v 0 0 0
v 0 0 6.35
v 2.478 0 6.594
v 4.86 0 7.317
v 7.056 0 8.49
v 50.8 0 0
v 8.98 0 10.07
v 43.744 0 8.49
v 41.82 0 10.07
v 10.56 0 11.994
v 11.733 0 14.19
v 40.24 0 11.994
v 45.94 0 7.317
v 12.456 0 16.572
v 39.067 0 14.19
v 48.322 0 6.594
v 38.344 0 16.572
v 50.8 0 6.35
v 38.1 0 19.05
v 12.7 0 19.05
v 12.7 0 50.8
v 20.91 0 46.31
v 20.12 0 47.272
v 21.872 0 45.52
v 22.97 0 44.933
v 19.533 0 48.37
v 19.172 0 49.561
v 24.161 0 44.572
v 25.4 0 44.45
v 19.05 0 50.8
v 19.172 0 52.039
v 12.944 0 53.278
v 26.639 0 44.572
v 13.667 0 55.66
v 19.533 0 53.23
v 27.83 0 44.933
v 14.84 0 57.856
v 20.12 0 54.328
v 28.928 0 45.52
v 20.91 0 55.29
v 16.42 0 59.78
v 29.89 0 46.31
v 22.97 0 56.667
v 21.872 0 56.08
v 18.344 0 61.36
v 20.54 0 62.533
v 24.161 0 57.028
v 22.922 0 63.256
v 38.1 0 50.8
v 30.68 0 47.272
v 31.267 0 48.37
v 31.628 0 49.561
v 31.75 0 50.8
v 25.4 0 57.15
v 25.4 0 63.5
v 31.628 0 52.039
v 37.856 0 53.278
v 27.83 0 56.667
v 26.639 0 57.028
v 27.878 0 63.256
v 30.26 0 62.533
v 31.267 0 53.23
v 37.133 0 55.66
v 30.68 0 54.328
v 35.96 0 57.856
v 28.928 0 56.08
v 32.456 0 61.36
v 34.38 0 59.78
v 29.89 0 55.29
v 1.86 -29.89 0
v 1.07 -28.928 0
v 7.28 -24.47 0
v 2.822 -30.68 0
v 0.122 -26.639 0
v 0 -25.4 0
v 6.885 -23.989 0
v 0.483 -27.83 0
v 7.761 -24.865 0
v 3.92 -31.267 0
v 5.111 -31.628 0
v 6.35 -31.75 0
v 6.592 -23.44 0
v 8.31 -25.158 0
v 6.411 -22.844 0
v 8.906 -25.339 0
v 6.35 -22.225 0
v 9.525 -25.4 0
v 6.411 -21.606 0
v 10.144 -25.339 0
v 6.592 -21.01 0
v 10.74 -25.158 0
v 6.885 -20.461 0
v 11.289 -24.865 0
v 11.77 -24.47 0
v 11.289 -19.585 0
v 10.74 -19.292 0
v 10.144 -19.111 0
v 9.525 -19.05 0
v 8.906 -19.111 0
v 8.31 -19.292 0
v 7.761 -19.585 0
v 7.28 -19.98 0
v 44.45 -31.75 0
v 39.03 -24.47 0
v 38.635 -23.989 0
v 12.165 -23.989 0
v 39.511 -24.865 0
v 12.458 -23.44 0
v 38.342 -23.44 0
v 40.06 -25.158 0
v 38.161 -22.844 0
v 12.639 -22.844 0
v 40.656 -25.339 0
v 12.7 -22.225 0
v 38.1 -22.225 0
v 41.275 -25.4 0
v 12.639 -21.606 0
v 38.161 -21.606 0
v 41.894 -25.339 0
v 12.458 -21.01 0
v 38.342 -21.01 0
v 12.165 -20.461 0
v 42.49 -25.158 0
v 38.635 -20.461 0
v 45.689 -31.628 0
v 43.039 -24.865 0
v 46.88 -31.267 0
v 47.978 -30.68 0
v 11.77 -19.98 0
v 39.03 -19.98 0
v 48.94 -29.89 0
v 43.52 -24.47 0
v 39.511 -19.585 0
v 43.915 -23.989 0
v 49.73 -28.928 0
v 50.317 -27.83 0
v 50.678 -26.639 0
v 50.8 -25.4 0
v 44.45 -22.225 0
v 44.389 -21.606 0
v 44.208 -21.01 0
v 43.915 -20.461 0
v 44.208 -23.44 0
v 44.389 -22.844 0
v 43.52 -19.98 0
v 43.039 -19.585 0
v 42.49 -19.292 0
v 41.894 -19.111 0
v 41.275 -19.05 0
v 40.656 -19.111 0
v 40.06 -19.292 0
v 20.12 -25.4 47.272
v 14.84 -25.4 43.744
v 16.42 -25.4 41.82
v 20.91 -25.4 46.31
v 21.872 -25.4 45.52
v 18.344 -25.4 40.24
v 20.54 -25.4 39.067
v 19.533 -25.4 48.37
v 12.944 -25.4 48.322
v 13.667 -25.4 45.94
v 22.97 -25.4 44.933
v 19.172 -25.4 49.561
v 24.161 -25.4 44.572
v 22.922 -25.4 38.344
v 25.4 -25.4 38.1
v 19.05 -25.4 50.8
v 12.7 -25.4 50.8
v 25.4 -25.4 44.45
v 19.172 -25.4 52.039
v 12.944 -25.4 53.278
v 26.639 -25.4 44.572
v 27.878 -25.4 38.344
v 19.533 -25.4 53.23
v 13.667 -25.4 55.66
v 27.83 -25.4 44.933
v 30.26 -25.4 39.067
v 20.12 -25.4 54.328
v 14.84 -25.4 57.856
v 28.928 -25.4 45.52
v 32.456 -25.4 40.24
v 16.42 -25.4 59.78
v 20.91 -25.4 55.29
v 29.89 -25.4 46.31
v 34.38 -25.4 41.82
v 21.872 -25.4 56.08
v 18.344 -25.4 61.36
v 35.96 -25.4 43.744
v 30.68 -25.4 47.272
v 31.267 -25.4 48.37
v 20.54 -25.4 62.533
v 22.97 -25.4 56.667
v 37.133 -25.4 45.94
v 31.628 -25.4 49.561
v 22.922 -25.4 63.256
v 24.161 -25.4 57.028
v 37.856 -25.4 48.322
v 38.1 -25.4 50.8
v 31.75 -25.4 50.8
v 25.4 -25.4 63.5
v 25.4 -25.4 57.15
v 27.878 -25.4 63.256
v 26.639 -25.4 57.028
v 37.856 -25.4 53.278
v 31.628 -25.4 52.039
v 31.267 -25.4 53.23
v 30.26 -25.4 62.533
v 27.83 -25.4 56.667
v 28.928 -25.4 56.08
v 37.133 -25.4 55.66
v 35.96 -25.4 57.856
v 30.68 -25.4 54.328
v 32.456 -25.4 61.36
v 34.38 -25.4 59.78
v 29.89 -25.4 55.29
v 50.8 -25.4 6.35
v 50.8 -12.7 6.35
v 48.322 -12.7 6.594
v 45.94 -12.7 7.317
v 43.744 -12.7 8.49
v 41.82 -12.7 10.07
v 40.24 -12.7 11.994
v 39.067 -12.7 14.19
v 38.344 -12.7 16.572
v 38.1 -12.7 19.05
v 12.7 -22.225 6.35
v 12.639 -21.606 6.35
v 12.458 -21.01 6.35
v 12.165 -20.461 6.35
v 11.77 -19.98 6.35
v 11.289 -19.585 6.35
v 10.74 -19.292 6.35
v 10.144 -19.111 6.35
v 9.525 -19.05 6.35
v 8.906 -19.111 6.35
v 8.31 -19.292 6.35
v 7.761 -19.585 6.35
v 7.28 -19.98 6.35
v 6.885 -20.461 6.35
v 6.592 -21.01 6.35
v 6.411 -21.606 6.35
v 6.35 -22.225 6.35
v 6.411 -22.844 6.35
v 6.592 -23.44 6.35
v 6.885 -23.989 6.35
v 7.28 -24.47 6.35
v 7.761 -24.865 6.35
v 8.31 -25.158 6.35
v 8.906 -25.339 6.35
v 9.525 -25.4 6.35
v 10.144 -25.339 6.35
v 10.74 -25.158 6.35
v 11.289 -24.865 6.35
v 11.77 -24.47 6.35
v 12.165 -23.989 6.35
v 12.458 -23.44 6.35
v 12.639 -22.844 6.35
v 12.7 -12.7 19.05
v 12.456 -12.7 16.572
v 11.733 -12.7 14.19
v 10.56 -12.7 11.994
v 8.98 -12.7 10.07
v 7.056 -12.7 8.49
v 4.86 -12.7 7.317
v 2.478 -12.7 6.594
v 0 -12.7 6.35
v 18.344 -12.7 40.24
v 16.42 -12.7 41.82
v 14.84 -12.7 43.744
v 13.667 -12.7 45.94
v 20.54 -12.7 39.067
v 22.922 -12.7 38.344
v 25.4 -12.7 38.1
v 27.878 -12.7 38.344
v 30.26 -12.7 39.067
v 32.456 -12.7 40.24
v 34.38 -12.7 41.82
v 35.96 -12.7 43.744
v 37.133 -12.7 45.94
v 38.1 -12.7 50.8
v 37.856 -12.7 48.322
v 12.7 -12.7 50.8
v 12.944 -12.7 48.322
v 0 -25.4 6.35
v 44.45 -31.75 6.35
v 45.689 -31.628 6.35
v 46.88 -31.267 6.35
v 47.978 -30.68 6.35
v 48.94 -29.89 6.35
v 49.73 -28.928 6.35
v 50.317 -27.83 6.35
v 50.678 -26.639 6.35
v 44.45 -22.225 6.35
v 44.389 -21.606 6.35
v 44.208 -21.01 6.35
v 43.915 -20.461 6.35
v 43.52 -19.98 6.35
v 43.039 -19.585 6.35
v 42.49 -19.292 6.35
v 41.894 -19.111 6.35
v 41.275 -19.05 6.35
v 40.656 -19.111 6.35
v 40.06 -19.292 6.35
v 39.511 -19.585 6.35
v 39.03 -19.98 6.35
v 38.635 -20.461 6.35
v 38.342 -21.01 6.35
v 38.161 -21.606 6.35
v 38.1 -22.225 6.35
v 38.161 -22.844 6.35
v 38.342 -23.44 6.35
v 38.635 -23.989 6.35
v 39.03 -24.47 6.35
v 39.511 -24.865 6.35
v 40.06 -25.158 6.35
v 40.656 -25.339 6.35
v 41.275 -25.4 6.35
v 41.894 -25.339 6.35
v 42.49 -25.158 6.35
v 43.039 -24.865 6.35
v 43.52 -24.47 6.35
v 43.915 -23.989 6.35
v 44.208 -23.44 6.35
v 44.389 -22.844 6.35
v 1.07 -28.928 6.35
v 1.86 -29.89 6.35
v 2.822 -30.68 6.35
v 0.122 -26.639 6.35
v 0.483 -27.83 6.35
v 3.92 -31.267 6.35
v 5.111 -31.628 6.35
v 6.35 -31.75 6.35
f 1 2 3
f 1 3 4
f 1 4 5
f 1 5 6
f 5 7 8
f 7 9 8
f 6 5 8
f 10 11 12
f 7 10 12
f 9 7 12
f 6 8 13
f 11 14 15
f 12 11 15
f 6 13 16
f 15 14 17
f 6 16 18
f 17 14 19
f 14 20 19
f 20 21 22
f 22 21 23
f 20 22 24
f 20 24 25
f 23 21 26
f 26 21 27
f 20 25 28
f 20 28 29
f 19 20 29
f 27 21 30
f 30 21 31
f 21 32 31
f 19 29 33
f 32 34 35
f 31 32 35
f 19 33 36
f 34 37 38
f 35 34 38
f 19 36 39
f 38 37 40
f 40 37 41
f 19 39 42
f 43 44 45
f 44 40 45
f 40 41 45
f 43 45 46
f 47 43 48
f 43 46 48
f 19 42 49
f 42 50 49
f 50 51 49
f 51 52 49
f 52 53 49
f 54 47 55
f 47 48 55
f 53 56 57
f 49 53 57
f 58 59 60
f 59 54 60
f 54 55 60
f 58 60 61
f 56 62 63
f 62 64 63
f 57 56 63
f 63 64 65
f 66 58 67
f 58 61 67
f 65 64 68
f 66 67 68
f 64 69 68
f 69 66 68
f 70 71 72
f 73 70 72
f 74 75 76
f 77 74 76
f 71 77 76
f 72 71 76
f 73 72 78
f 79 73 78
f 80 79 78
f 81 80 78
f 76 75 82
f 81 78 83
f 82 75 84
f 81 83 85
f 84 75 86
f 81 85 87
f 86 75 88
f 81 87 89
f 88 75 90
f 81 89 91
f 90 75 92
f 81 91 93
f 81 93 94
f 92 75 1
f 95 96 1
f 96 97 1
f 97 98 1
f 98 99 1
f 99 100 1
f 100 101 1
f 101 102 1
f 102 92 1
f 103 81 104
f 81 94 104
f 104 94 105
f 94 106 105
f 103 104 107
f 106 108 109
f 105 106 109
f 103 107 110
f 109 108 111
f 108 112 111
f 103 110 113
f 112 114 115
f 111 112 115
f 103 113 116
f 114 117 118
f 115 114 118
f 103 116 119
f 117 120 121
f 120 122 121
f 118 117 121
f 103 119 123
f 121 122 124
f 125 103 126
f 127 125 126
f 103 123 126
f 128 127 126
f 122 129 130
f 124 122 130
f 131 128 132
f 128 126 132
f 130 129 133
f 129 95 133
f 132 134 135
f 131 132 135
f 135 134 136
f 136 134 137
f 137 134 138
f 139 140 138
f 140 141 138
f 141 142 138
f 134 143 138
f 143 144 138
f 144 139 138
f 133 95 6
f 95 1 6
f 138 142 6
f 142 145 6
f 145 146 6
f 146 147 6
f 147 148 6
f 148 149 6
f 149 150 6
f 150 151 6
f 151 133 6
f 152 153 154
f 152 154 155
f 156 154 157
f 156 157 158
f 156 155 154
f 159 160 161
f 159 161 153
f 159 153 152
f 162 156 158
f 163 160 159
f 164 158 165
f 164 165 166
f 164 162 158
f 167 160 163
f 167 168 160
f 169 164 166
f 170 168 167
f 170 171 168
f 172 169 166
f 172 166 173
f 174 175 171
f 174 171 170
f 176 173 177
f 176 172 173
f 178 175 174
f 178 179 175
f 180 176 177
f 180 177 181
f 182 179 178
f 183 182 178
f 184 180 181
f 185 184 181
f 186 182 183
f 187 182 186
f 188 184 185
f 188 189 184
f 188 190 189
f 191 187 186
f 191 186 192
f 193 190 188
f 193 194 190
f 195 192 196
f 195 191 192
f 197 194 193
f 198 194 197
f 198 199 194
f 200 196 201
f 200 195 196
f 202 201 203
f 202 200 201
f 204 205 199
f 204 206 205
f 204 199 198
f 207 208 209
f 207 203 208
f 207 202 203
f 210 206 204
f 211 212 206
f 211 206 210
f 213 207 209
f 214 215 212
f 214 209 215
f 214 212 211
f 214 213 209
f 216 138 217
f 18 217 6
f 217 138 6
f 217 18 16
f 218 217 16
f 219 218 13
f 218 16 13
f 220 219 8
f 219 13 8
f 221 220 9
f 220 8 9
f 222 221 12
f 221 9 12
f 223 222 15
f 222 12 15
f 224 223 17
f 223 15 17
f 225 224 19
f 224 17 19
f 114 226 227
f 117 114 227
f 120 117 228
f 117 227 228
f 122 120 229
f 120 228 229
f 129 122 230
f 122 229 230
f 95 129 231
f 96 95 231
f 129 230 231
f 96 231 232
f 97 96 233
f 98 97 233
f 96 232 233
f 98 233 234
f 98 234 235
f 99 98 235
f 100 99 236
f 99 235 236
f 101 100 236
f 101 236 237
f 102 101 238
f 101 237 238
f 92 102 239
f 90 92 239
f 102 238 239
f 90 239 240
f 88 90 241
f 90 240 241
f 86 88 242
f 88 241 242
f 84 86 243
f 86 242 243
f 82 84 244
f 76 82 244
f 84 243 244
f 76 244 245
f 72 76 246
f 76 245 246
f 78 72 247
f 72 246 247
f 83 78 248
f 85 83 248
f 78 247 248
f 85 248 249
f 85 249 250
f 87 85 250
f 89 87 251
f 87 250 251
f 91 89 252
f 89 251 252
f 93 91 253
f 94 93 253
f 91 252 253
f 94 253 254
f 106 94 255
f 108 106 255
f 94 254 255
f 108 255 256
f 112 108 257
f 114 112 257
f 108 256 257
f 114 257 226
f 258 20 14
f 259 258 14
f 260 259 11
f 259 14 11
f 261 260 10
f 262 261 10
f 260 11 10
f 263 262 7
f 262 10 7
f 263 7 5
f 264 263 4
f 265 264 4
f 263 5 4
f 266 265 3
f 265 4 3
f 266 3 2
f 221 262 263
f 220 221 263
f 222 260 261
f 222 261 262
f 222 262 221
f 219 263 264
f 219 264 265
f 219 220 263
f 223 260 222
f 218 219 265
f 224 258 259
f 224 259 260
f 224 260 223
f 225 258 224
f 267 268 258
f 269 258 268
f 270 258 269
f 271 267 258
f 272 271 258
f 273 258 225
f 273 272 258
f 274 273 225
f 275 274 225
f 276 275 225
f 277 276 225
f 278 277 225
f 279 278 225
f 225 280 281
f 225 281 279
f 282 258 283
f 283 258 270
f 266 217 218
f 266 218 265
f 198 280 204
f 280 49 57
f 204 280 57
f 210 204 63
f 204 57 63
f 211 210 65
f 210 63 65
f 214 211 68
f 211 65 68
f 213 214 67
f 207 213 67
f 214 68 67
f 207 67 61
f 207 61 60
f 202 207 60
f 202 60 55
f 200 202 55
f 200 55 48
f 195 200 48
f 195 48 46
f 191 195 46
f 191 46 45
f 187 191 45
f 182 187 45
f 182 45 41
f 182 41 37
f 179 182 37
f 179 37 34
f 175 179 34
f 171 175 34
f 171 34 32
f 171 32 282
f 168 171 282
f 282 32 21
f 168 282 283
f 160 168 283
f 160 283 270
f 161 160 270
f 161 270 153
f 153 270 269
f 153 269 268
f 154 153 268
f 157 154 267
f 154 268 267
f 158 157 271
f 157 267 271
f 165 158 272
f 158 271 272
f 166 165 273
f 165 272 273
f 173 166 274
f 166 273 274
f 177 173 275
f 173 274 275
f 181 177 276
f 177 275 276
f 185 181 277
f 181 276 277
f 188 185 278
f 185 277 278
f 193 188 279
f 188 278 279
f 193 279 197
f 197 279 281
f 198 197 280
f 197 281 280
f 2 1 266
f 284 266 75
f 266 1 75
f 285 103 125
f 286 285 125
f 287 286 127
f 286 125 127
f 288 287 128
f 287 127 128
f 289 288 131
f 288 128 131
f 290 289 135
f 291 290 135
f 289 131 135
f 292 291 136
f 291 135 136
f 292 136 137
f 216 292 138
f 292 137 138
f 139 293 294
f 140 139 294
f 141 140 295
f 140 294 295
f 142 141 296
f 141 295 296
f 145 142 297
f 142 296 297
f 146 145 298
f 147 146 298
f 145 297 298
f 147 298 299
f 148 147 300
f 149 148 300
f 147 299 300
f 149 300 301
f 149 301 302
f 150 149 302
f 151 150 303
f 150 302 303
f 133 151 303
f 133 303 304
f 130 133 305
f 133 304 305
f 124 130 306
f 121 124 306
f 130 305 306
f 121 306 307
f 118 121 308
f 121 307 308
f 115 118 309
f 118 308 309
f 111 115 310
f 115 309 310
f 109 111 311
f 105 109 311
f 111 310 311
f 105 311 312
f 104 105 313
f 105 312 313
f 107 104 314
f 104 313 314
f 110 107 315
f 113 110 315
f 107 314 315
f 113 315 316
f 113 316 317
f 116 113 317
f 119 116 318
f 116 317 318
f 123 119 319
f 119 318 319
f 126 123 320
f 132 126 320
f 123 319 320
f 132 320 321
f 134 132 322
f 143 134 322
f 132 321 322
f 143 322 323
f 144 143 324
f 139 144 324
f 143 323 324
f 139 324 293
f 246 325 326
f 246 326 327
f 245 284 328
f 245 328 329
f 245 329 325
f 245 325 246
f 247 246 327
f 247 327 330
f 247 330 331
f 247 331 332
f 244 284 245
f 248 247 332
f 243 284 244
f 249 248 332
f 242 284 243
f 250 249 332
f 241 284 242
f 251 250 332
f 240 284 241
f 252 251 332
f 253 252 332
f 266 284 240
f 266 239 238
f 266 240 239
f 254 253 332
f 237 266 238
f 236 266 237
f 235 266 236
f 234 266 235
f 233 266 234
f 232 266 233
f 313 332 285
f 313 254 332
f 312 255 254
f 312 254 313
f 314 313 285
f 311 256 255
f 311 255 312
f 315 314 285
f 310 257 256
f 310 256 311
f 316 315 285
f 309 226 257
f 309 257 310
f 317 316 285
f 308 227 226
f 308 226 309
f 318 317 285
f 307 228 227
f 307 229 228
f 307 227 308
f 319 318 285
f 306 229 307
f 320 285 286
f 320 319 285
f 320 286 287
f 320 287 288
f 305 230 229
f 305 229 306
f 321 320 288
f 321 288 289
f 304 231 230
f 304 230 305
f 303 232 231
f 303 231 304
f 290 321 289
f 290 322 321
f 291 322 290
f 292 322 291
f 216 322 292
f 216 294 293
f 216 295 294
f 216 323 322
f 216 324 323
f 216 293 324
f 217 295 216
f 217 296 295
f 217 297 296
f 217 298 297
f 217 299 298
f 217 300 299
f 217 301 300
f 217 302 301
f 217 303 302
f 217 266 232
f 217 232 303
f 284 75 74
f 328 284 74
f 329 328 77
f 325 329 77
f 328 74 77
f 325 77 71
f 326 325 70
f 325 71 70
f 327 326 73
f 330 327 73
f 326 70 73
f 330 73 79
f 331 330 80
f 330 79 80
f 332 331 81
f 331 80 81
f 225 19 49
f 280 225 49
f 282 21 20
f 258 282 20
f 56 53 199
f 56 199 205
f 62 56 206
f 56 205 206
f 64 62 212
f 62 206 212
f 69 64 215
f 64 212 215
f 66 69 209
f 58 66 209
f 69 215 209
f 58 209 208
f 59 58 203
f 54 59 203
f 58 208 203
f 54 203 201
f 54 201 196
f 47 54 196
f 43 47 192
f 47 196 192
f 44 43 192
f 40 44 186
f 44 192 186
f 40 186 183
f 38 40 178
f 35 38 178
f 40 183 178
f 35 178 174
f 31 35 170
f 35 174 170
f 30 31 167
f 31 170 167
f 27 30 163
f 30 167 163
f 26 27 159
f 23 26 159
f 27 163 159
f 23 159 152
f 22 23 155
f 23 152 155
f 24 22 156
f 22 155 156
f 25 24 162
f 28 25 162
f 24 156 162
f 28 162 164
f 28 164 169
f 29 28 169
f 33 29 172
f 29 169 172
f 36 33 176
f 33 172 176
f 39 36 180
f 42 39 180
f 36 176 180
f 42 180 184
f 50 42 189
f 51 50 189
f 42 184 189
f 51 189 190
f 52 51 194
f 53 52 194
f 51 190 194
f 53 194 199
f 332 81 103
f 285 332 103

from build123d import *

# Parameters (mm, degrees)
F1_DEPTH = 6.35
F3_DEPTH = 12.7
F5_DEPTH = 12.7
F6_R     = 6.35
F7_DEPTH = 25.4
F8_R     = 3.175
F9_DEPTH = 6.35


with BuildPart() as f1:
    # F0 (on Top) → F1 (new body)
    with BuildSketch(Plane.XY):
        with BuildLine():
            Line((50.8, 0), (0, 0))
            Line((0, 0), (0, -25.4))
            ThreePointArc((0, -25.4), (6.35, -19.05), (12.7, -25.4))
            Line((12.7, -25.4), (38.1, -25.4))
            ThreePointArc((38.1, -25.4), (44.45, -19.05), (50.8, -25.4))
            Line((50.8, -25.4), (50.8, 0))
        make_face()
        with BuildLine():
            ThreePointArc((12.7, -25.4), (6.35, -19.05), (0, -25.4))
            Line((0, -25.4), (6.35, -25.4))
            Line((6.35, -25.4), (12.7, -25.4))
        make_face()
        with BuildLine():
            Line((6.35, -25.4), (0, -25.4))
            ThreePointArc((0, -25.4), (1.8598719395, -29.8901280605), (6.35, -31.75))
            Line((6.35, -31.75), (6.35, -25.4))
        make_face()
        with BuildLine():
            Line((12.7, -25.4), (6.35, -25.4))
            Line((6.35, -25.4), (6.35, -31.75))
            ThreePointArc((6.35, -31.75), (10.8401280605, -29.8901280605), (12.7, -25.4))
        make_face()
        with BuildLine():
            Line((38.1, -25.4), (12.7, -25.4))
            ThreePointArc((12.7, -25.4), (10.8401280605, -29.8901280605), (6.35, -31.75))
            Line((6.35, -31.75), (44.45, -31.75))
            ThreePointArc((44.45, -31.75), (39.9598719395, -29.8901280605), (38.1, -25.4))
        make_face()
        with BuildLine():
            Line((44.45, -31.75), (44.45, -25.4))
            Line((44.45, -25.4), (38.1, -25.4))
            ThreePointArc((38.1, -25.4), (39.9598719395, -29.8901280605), (44.45, -31.75))
        make_face()
        with BuildLine():
            ThreePointArc((44.45, -31.75), (48.9401280605, -29.8901280605), (50.8, -25.4))
            Line((50.8, -25.4), (44.45, -25.4))
            Line((44.45, -25.4), (44.45, -31.75))
        make_face()
        with BuildLine():
            Line((44.45, -25.4), (50.8, -25.4))
            ThreePointArc((50.8, -25.4), (44.45, -19.05), (38.1, -25.4))
            Line((38.1, -25.4), (44.45, -25.4))
        make_face()
    extrude(amount=F1_DEPTH)

    # F2 (on Front) → F3 (join)
    with BuildSketch(Plane.XZ):
        with BuildLine():
            Line((12.7, 19.05), (12.7, 6.35))
            Line((12.7, 6.35), (38.1, 6.35))
            Line((38.1, 6.35), (38.1, 19.05))
            Line((38.1, 19.05), (38.1, 50.8))
            ThreePointArc((38.1, 50.8), (25.4, 38.1), (12.7, 50.8))
            Line((12.7, 50.8), (12.7, 19.05))
        make_face()
        with BuildLine():
            Line((0, 6.35), (12.7, 6.35))
            Line((12.7, 6.35), (12.7, 19.05))
            ThreePointArc((12.7, 19.05), (8.9802561211, 10.0697438789), (0, 6.35))
        make_face()
        with BuildLine():
            Line((38.1, 19.05), (38.1, 6.35))
            Line((38.1, 6.35), (50.8, 6.35))
            ThreePointArc((50.8, 6.35), (41.8197438789, 10.0697438789), (38.1, 19.05))
        make_face()
        with BuildLine():
            ThreePointArc((38.1, 50.8), (25.4, 63.5), (12.7, 50.8))
            Line((12.7, 50.8), (38.1, 50.8))
        make_face()
        with BuildLine():
            Line((38.1, 50.8), (12.7, 50.8))
            ThreePointArc((12.7, 50.8), (25.4, 38.1), (38.1, 50.8))
        make_face()
    extrude(amount=F3_DEPTH)

    # F4 (on face) → F5 (join)
    with BuildSketch(Plane.XZ.offset(12.7)):
        with BuildLine():
            ThreePointArc((12.7, 50.8), (25.4, 38.1), (38.1, 50.8))
            ThreePointArc((38.1, 50.8), (25.4, 63.5), (12.7, 50.8))
        make_face()
    extrude(amount=F5_DEPTH)

    # F6 (on face) → F7 (cut)
    with BuildSketch(Plane.XZ.offset(25.4)):
        with Locations((25.4, 50.8)):
            Circle(F6_R)
    extrude(amount=-F7_DEPTH, mode=Mode.SUBTRACT)

    # F8 (on face) → F9 (cut)
    with BuildSketch(Plane.XY.offset(6.35)):
        with Locations((9.525, -22.225)):
            Circle(F8_R)
        with Locations((41.275, -22.225)):
            Circle(F8_R)
    extrude(amount=-F9_DEPTH, mode=Mode.SUBTRACT)


solid = f1.part
